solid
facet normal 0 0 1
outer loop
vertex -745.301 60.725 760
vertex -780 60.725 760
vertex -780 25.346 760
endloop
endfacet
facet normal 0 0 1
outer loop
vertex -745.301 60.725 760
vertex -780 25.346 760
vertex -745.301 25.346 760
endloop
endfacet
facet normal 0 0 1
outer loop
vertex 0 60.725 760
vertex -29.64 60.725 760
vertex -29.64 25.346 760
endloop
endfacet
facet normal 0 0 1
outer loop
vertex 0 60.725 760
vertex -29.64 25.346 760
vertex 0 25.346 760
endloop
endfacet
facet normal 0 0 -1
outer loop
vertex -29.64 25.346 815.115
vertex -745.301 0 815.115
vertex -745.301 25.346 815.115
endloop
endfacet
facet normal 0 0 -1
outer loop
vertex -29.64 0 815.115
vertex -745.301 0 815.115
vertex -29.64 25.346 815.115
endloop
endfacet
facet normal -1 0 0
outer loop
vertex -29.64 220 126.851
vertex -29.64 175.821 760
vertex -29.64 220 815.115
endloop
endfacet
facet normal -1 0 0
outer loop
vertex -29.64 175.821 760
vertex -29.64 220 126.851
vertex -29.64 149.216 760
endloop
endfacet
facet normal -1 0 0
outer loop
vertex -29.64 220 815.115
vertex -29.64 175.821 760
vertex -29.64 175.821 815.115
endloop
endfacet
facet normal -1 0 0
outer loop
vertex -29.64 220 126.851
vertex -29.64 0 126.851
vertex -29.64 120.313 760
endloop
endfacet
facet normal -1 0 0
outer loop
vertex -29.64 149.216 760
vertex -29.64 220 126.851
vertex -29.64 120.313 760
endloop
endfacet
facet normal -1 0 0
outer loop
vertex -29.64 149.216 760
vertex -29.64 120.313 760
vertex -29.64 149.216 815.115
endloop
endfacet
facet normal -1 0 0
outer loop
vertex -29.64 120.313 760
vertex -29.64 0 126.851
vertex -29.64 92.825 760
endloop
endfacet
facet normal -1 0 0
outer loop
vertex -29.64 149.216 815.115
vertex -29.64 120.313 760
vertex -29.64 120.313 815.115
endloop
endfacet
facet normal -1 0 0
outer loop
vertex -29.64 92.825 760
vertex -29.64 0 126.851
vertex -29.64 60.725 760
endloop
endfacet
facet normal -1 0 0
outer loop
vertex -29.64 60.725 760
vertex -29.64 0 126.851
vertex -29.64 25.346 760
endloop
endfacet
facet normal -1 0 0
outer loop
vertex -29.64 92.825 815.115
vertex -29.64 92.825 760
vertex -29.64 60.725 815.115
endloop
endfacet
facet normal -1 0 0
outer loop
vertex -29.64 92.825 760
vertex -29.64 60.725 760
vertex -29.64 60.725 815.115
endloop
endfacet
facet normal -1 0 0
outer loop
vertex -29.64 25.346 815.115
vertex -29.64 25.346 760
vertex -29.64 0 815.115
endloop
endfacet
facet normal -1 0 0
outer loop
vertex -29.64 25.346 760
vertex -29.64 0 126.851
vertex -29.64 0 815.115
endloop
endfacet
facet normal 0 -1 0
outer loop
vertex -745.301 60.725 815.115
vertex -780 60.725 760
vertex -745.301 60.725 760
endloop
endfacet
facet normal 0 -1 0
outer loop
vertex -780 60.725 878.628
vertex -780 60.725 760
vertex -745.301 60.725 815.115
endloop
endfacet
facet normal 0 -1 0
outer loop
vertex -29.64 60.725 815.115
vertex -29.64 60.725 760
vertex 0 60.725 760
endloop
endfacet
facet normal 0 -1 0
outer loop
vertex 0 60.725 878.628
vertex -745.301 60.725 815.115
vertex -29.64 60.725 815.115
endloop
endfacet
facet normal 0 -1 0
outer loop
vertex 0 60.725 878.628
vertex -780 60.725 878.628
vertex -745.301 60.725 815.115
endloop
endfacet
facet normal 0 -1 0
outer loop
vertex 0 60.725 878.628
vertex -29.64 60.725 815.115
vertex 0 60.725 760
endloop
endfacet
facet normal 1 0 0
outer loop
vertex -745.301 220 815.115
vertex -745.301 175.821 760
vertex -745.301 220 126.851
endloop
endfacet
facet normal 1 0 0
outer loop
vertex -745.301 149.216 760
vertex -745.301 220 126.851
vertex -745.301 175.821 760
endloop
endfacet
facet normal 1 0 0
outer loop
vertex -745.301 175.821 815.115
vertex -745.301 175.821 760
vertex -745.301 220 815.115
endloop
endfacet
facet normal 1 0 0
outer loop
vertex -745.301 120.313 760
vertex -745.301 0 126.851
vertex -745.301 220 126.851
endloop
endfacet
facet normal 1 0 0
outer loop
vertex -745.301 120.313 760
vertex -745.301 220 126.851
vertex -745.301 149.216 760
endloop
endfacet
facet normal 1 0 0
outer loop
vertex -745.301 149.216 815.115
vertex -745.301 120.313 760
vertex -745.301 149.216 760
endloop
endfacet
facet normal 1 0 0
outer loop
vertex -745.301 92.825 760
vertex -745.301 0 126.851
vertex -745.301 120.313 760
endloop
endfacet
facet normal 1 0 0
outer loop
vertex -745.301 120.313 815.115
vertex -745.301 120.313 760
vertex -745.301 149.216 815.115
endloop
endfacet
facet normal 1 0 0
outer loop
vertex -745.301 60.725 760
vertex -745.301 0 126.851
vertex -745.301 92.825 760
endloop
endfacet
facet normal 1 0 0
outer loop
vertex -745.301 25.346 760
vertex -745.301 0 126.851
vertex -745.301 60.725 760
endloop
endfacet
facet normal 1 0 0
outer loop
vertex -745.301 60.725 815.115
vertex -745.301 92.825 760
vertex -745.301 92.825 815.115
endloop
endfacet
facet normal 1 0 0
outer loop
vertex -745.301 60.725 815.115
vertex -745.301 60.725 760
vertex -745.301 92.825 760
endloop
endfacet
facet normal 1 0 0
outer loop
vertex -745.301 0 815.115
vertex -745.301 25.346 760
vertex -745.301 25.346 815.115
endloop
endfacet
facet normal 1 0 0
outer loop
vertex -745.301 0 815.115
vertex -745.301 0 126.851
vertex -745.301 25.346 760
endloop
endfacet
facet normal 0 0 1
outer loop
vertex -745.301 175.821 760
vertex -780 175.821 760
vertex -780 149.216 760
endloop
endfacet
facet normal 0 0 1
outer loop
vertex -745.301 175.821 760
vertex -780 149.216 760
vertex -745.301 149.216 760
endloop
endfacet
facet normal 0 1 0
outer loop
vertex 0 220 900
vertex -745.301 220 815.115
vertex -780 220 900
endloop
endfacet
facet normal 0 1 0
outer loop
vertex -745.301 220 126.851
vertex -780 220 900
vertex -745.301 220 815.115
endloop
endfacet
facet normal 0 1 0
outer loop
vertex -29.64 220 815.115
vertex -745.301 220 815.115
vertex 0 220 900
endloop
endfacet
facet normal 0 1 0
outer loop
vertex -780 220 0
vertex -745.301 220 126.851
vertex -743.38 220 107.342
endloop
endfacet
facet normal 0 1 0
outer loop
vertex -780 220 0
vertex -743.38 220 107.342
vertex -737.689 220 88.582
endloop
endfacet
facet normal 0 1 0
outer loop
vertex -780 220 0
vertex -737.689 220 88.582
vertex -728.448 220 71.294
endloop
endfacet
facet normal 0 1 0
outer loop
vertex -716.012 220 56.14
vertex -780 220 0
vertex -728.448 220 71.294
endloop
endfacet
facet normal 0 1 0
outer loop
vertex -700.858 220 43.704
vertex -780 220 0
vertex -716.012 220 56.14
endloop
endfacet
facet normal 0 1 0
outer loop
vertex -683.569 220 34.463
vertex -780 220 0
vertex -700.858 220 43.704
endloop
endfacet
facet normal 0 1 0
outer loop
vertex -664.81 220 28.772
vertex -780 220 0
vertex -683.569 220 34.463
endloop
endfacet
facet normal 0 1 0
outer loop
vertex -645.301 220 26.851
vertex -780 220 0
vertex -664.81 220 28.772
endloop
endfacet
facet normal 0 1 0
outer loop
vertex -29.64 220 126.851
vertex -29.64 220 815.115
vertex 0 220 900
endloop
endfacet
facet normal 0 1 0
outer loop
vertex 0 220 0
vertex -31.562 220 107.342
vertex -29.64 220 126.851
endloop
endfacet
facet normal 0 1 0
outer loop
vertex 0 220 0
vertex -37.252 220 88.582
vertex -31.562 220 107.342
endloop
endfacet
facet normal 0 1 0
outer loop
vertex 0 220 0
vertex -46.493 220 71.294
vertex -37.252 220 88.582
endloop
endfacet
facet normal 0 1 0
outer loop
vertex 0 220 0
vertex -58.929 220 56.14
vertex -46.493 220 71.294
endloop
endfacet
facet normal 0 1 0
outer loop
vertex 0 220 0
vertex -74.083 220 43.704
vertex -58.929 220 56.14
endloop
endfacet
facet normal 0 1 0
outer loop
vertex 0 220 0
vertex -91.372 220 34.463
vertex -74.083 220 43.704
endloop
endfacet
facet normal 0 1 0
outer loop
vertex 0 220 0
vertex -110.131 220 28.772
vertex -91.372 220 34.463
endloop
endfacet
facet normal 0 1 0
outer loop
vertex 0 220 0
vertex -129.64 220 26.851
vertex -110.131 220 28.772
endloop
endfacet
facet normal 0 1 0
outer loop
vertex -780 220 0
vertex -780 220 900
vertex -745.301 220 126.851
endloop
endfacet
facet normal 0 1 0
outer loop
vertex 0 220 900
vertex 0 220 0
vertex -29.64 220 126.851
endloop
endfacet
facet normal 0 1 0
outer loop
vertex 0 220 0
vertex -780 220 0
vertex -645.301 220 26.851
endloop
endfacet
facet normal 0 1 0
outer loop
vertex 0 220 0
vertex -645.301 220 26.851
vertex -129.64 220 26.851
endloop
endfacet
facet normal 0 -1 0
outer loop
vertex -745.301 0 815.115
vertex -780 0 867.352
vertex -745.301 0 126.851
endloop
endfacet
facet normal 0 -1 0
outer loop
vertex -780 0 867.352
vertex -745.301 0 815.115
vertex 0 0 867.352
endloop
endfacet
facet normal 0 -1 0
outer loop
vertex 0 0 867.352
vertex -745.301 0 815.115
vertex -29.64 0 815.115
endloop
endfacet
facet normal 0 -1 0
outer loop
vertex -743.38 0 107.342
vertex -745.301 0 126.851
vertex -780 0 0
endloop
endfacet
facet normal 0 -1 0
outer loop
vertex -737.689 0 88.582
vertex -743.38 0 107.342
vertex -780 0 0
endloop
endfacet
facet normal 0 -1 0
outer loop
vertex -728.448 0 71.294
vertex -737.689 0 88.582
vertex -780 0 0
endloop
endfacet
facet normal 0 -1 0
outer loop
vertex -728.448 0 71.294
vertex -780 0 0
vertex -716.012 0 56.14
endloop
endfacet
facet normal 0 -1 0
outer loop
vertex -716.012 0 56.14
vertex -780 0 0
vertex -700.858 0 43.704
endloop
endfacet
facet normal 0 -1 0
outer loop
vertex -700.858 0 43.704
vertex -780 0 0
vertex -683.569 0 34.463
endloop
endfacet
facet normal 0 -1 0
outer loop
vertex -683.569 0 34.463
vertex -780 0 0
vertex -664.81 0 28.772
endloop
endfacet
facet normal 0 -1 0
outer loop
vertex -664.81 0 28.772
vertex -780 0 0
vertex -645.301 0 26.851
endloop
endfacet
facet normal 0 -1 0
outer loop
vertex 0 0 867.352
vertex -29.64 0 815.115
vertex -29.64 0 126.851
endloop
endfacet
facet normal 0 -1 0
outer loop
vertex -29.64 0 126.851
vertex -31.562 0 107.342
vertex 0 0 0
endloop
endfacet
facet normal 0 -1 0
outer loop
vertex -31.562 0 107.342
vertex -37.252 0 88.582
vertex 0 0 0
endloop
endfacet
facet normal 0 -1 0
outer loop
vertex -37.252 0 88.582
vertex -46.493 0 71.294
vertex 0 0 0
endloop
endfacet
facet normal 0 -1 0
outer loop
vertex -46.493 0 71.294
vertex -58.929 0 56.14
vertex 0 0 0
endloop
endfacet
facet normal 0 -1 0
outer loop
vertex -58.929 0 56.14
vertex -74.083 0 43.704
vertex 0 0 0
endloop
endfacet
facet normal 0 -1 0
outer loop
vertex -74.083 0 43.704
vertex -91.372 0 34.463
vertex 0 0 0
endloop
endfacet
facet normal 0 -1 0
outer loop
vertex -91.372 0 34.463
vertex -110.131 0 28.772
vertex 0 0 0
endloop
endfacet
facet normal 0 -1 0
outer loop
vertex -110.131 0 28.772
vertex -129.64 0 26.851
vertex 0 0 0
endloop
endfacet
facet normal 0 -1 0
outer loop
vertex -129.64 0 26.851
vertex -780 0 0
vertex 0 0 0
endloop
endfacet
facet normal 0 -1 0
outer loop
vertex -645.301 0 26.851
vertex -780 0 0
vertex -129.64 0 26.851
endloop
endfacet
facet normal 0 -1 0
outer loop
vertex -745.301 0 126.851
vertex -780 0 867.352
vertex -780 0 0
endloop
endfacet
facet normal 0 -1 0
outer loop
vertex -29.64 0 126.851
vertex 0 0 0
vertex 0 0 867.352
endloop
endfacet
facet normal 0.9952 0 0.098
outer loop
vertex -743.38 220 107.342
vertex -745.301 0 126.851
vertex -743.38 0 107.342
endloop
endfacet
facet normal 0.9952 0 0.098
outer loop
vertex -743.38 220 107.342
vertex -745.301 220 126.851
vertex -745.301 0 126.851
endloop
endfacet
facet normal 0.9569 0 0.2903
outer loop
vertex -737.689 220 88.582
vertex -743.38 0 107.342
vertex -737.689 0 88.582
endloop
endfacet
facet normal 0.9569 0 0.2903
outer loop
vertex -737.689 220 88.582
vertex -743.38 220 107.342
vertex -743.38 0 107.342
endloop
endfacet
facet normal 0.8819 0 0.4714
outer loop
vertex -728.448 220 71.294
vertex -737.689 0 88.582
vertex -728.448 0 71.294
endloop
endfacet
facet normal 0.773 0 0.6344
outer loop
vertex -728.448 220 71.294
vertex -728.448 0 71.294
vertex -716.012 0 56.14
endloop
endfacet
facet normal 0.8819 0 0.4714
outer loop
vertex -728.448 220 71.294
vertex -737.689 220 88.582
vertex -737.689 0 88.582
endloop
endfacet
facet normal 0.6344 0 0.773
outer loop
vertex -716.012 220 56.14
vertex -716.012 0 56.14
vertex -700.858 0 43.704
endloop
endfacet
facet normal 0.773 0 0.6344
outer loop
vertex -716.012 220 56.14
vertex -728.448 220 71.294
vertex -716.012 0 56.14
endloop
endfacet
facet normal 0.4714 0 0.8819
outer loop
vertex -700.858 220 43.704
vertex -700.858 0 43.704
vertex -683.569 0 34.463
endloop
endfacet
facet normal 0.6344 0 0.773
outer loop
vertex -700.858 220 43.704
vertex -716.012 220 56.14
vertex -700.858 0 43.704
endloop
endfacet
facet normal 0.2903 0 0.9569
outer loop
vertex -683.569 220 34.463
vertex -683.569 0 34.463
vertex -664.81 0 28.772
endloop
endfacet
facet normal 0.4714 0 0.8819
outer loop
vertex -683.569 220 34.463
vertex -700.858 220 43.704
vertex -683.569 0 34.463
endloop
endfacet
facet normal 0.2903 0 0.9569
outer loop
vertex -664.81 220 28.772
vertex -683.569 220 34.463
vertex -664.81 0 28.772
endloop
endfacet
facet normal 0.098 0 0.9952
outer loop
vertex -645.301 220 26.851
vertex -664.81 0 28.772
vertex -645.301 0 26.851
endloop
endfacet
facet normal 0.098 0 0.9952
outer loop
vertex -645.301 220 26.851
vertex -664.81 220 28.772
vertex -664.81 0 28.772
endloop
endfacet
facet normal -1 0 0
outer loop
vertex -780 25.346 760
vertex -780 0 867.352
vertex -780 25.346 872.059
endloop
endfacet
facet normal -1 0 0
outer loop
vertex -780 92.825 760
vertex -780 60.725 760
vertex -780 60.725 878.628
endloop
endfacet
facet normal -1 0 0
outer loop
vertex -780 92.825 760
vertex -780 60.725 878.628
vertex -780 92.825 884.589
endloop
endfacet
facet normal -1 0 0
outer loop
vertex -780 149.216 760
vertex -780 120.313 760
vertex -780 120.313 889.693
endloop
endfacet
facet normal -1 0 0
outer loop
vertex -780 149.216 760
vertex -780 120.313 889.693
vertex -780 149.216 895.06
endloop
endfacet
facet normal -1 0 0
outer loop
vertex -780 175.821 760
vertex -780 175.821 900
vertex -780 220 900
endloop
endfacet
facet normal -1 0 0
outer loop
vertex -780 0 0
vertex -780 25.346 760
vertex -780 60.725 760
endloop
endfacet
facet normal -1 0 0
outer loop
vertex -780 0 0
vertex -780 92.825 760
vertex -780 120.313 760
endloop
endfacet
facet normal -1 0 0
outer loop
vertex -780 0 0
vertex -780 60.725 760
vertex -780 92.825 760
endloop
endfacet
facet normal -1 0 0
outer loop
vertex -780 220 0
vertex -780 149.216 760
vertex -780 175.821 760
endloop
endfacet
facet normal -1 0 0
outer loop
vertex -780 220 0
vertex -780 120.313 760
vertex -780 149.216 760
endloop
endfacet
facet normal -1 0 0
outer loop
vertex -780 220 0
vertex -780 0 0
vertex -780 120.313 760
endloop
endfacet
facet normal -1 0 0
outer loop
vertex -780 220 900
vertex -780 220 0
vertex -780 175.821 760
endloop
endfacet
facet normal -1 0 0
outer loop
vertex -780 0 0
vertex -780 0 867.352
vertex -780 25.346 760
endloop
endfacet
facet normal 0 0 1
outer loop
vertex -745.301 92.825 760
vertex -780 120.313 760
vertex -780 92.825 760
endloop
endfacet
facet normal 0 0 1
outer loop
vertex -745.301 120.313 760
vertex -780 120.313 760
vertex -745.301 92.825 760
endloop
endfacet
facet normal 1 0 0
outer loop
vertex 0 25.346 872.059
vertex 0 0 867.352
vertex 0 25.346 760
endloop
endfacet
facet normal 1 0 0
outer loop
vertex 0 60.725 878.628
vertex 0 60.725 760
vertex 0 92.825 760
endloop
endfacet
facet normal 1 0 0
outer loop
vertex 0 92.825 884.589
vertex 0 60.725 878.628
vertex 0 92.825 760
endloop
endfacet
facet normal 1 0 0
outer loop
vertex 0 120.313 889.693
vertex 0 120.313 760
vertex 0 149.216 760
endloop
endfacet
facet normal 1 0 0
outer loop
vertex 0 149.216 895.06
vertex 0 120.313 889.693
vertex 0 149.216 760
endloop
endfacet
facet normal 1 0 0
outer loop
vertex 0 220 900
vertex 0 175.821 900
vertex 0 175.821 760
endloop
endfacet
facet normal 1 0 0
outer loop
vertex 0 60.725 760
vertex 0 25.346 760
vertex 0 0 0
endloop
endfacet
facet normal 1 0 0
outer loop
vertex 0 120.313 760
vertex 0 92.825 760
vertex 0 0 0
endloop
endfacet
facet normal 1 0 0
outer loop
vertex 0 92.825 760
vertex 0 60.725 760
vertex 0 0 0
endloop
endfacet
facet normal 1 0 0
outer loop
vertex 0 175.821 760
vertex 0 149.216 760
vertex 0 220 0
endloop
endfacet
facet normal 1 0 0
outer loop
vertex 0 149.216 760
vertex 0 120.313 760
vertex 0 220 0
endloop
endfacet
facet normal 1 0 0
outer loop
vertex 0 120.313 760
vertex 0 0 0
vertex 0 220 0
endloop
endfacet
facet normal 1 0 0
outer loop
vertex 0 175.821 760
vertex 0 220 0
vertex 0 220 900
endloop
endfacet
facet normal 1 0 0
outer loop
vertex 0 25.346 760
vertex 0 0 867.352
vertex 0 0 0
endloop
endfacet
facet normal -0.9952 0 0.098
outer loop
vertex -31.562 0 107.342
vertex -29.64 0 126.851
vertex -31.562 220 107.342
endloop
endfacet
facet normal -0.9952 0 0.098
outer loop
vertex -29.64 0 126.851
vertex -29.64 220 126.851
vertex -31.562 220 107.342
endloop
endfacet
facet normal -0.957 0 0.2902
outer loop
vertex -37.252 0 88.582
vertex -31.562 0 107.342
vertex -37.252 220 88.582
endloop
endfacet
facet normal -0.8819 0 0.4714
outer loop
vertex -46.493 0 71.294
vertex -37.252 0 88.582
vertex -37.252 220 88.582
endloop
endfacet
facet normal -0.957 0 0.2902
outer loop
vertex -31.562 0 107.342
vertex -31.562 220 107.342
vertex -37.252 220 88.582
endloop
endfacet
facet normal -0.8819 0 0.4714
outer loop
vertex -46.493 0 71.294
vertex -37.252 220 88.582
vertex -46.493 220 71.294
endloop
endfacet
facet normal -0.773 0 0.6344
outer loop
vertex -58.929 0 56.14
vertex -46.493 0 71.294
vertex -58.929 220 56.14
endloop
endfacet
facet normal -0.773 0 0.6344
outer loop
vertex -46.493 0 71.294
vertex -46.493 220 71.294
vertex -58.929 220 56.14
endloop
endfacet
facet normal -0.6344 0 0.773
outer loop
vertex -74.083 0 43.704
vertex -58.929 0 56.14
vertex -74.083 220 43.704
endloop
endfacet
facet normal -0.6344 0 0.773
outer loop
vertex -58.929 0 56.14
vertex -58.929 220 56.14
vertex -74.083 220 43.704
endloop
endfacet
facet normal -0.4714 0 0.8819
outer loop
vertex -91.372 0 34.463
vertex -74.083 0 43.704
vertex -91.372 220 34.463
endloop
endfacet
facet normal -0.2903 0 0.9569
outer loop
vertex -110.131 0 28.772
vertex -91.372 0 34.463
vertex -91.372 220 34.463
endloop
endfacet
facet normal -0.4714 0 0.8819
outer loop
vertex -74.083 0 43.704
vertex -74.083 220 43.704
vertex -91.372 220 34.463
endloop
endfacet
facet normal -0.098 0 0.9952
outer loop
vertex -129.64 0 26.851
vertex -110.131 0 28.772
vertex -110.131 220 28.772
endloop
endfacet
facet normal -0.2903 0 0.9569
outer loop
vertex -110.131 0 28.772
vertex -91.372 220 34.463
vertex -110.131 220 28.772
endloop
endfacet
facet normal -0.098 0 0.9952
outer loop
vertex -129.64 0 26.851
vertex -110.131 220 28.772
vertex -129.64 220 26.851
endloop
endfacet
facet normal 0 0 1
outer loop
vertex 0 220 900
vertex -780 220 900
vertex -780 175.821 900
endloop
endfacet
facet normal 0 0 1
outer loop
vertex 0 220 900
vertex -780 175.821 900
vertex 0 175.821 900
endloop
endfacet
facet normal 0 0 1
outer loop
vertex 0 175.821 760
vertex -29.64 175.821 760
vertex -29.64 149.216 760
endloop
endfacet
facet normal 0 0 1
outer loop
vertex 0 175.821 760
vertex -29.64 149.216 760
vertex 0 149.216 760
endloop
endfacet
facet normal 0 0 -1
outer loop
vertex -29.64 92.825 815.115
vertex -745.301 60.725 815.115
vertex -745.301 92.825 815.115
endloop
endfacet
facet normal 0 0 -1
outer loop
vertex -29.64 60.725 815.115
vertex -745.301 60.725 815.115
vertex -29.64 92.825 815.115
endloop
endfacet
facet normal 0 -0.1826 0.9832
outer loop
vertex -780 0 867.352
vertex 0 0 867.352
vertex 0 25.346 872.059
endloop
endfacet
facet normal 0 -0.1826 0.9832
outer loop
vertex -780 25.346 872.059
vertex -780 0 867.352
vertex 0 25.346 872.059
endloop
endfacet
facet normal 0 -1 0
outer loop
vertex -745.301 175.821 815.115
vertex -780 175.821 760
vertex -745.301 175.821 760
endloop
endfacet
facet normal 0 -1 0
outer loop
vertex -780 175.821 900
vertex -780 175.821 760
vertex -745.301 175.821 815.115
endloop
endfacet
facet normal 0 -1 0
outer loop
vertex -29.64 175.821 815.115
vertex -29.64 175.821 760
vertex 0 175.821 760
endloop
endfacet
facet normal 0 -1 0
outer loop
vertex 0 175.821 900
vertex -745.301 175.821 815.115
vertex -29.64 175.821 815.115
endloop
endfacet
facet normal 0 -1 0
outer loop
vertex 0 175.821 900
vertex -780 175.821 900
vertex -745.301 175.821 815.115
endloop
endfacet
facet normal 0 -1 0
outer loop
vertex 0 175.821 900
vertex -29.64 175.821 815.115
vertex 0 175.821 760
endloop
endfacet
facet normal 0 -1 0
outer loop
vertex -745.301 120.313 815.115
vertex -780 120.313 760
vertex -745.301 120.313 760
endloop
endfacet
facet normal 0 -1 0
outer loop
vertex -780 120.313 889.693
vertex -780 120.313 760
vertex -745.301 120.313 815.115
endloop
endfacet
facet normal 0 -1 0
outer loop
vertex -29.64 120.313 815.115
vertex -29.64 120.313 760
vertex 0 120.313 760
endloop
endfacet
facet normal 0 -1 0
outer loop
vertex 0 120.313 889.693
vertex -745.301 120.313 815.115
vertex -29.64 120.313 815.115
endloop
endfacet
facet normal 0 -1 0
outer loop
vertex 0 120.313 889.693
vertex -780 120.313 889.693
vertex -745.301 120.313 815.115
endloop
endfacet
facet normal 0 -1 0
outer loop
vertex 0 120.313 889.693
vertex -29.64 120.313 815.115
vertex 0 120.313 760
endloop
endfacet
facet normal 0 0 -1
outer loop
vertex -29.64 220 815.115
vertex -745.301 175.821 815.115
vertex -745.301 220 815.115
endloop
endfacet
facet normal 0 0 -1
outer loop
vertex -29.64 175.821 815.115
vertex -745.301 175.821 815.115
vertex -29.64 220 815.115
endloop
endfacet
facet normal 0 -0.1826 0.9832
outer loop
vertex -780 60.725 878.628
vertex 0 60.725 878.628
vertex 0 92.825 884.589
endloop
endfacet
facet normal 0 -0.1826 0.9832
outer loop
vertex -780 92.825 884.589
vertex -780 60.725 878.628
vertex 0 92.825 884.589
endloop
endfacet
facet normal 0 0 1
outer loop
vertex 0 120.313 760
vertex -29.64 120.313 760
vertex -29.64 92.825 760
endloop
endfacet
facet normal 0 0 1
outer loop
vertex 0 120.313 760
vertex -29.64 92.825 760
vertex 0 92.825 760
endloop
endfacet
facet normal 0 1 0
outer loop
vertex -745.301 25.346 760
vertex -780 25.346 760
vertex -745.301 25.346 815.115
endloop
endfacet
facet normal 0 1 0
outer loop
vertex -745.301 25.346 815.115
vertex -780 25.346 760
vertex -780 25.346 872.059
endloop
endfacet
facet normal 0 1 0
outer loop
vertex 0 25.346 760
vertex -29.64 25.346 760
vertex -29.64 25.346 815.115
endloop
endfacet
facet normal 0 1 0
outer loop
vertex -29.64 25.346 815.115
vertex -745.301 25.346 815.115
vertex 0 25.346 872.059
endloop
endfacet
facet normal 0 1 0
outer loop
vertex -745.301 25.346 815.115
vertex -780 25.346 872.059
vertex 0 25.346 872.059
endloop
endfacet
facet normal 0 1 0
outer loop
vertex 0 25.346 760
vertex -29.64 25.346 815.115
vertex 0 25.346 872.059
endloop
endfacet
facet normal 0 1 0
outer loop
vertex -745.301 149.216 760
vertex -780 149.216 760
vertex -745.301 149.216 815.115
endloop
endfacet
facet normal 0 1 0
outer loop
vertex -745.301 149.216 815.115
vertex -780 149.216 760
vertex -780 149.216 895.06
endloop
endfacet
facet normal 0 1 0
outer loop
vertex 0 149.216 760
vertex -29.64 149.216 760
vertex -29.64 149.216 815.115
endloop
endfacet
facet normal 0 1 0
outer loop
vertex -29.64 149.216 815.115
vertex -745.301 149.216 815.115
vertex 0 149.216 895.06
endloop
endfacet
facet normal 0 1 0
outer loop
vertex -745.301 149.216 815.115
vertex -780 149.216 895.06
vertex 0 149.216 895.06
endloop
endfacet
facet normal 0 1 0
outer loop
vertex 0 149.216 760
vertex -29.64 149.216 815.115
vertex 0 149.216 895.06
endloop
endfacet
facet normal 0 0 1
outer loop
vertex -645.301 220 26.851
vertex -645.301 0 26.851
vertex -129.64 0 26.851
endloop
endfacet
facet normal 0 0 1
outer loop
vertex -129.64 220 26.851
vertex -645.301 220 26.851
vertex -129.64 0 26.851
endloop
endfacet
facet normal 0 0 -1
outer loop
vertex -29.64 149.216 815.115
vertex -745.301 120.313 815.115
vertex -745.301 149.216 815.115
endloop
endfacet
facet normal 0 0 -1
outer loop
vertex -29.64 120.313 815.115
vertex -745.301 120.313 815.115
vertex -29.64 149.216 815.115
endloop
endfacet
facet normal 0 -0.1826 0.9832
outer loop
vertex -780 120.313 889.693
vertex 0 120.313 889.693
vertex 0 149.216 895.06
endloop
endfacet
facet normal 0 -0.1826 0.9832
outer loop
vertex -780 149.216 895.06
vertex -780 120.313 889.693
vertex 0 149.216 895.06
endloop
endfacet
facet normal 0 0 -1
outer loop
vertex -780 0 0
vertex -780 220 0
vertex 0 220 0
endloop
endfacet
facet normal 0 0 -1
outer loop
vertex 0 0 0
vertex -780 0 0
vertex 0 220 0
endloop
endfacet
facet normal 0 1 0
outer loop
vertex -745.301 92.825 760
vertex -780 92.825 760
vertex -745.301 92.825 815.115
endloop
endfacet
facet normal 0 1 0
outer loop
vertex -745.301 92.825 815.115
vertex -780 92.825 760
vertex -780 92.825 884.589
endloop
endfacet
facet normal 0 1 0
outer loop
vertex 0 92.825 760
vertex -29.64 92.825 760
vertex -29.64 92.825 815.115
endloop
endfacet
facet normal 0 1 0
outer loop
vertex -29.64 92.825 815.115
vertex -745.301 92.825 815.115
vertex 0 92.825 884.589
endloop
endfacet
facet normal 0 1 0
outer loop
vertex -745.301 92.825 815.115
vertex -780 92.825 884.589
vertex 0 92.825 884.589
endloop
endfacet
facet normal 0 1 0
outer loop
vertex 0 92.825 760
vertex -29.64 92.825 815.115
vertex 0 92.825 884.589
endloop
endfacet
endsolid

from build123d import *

# Parameters (mm, degrees)
F0_W     = 780
F0_H     = 220
F1_DEPTH = 900
F2_W     = 715.66108
F2_H     = 788.264372
F3_DEPTH = 220
F5_DEPTH = 780
F6_W     = 780
F6_H     = 27.488791
F6_H_2   = 35.378739
F6_H_3   = 26.604801
F7_DEPTH = 140
F8_R     = 100


with BuildPart() as f1:
    # F0 (on Top) → F1 (new body)
    with BuildSketch(Plane.XY):
        with Locations((-390, 110)):
            Rectangle(F0_W, F0_H)
    extrude(amount=F1_DEPTH)

    # F2 (on face) → F3 (cut, through all)
    with BuildSketch(Plane.XZ):
        with Locations((-387.470587, 420.982849)):
            Rectangle(F2_W, F2_H)
    extrude(amount=-F3_DEPTH, mode=Mode.SUBTRACT)

    # F4 (on face) → F5 (cut, through all)
    with BuildSketch(Plane.YZ):
        Polygon((0, 867.352068), (175.820604, 900), (0, 900), align=None)
    extrude(amount=-F5_DEPTH, mode=Mode.SUBTRACT)

    # F6 (on face) → F7 (cut)
    with BuildSketch(Plane.XY.offset(900)):
        with Locations((-390, 106.569055)):
            Rectangle(F6_W, F6_H)
        with Locations((-390, 43.035474)):
            Rectangle(F6_W, F6_H_2)
        with Locations((-390, 162.518203)):
            Rectangle(F6_W, F6_H_3)
    extrude(amount=-F7_DEPTH, mode=Mode.SUBTRACT)

    # F8
    f8_edges = [f1.edges().sort_by_distance(p)[0] for p in [
        (-745.301127, 110, 26.850663),
        (-29.640047, 110, 26.850663),
    ]]
    fillet(f8_edges, radius=F8_R)


solid = f1.part
